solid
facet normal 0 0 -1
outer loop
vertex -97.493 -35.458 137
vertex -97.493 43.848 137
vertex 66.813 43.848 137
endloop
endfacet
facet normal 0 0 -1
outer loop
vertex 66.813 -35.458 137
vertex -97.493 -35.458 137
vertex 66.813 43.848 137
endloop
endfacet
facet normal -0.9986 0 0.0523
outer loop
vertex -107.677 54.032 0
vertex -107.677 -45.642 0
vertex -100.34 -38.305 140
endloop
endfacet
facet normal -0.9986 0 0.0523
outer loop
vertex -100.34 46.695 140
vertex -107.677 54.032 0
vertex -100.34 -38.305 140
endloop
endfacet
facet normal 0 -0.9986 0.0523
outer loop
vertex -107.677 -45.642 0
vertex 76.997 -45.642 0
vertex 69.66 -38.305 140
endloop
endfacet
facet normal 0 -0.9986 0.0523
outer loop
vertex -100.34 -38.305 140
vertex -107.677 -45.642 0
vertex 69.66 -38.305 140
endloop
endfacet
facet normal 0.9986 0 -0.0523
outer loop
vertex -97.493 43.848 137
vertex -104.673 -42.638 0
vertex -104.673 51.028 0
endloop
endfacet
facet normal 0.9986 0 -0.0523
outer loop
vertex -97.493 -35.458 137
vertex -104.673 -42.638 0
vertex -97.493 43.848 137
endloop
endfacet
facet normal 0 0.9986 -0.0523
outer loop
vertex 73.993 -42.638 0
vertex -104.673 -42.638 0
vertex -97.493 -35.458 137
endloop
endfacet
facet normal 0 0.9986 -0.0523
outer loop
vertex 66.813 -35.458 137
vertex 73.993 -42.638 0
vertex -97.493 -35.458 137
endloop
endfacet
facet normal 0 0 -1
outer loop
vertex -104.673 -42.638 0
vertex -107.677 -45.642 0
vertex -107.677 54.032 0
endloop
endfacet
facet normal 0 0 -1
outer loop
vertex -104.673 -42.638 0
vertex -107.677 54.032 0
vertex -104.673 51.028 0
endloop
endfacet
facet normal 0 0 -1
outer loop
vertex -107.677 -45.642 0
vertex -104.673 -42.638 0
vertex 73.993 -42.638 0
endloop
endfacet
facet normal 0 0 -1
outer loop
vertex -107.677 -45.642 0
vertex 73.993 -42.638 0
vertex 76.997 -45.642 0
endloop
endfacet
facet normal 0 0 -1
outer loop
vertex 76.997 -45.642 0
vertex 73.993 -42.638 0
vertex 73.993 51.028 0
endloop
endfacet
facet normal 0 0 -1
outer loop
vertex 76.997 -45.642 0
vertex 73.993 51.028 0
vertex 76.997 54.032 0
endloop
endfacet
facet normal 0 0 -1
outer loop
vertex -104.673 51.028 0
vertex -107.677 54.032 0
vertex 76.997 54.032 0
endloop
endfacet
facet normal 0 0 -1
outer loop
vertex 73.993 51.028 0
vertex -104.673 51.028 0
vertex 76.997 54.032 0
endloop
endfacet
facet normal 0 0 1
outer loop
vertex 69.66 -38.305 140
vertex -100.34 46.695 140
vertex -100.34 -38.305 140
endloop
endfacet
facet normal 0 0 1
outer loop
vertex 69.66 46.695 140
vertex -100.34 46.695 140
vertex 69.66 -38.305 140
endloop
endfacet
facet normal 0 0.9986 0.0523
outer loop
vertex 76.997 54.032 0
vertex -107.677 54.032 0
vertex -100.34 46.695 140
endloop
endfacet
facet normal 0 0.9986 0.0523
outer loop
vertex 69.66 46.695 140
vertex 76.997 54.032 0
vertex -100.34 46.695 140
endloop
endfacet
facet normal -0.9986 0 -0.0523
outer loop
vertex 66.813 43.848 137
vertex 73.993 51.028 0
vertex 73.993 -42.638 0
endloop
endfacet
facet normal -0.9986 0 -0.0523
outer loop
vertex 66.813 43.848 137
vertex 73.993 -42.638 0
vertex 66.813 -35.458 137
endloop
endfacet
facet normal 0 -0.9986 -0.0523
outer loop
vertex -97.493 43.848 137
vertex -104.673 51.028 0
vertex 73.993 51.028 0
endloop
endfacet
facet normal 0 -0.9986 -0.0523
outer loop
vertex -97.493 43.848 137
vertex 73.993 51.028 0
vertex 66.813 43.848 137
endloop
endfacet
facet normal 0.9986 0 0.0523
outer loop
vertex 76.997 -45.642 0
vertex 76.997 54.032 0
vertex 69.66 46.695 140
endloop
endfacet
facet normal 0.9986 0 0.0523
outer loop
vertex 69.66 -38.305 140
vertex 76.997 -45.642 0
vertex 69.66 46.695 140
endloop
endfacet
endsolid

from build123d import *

# Parameters (mm, degrees)
SKETCH1_W           = 190
SKETCH1_H           = 105
BOSS_EXTRUDE1_DEPTH = 140
CHAMFER1_SIZE       = 190.811366877
CHAMFER1_SIZE_2     = 10
SHELL1_T            = -3


with BuildPart() as part:
    # Sketch1 → Boss-Extrude1 (new body)
    with BuildSketch(Plane.XY):
        with Locations((-15.339943343, 4.194995279)):
            Rectangle(SKETCH1_W, SKETCH1_H)
    extrude(amount=BOSS_EXTRUDE1_DEPTH)

    # Chamfer1
    # the kernel refuses this chamfer: 190.811366877, 10 mm, written as the material it takes off along each edge
    with BuildSketch(Plane(origin=(-606.424352322, 56.694995279, 140), x_dir=(0, 0.00201302342238207, -0.9999979738662977), z_dir=(1, 0, 0)), Plane(origin=(575.744465637, -48.305004721, 140), x_dir=(0, -0.00201302342238207, -0.9999979738662977), z_dir=(-1, 0, 0))) as chamfer1_piece_1:
        Polygon((CHAMFER1_SIZE * 0.999997973868, -CHAMFER1_SIZE * 0.00201302342239), (-CHAMFER1_SIZE_2 * 0.00201302342238, -CHAMFER1_SIZE_2 * 0.999997973866), (0, 0), align=None)
    extrude(amount=1182.168817959, mode=Mode.SUBTRACT)
    with BuildSketch(Plane(origin=(79.660056657, 552.779404258, 140), x_dir=(0.0020130234223821055, 0, -0.9999979738662977), z_dir=(0, -1, 0)), Plane(origin=(-110.339943343, -544.389413701, 140), x_dir=(-0.0020130234223821055, 0, -0.9999979738662977), z_dir=(0, 1, 0))) as chamfer1_piece_2:
        Polygon((CHAMFER1_SIZE * 0.999997973868, -CHAMFER1_SIZE * 0.00201302342239), (-CHAMFER1_SIZE_2 * 0.00201302342238, -CHAMFER1_SIZE_2 * 0.999997973866), (0, 0), align=None)
    extrude(amount=1097.168817959, mode=Mode.SUBTRACT)

    # Shell1
    shell1_openings = [part.faces().sort_by_distance(p)[0] for p in [
        (-15.339943343, 4.194995279, 0),
    ]]
    offset(amount=SHELL1_T, openings=shell1_openings, kind=Kind.INTERSECTION)


solid = part.part
